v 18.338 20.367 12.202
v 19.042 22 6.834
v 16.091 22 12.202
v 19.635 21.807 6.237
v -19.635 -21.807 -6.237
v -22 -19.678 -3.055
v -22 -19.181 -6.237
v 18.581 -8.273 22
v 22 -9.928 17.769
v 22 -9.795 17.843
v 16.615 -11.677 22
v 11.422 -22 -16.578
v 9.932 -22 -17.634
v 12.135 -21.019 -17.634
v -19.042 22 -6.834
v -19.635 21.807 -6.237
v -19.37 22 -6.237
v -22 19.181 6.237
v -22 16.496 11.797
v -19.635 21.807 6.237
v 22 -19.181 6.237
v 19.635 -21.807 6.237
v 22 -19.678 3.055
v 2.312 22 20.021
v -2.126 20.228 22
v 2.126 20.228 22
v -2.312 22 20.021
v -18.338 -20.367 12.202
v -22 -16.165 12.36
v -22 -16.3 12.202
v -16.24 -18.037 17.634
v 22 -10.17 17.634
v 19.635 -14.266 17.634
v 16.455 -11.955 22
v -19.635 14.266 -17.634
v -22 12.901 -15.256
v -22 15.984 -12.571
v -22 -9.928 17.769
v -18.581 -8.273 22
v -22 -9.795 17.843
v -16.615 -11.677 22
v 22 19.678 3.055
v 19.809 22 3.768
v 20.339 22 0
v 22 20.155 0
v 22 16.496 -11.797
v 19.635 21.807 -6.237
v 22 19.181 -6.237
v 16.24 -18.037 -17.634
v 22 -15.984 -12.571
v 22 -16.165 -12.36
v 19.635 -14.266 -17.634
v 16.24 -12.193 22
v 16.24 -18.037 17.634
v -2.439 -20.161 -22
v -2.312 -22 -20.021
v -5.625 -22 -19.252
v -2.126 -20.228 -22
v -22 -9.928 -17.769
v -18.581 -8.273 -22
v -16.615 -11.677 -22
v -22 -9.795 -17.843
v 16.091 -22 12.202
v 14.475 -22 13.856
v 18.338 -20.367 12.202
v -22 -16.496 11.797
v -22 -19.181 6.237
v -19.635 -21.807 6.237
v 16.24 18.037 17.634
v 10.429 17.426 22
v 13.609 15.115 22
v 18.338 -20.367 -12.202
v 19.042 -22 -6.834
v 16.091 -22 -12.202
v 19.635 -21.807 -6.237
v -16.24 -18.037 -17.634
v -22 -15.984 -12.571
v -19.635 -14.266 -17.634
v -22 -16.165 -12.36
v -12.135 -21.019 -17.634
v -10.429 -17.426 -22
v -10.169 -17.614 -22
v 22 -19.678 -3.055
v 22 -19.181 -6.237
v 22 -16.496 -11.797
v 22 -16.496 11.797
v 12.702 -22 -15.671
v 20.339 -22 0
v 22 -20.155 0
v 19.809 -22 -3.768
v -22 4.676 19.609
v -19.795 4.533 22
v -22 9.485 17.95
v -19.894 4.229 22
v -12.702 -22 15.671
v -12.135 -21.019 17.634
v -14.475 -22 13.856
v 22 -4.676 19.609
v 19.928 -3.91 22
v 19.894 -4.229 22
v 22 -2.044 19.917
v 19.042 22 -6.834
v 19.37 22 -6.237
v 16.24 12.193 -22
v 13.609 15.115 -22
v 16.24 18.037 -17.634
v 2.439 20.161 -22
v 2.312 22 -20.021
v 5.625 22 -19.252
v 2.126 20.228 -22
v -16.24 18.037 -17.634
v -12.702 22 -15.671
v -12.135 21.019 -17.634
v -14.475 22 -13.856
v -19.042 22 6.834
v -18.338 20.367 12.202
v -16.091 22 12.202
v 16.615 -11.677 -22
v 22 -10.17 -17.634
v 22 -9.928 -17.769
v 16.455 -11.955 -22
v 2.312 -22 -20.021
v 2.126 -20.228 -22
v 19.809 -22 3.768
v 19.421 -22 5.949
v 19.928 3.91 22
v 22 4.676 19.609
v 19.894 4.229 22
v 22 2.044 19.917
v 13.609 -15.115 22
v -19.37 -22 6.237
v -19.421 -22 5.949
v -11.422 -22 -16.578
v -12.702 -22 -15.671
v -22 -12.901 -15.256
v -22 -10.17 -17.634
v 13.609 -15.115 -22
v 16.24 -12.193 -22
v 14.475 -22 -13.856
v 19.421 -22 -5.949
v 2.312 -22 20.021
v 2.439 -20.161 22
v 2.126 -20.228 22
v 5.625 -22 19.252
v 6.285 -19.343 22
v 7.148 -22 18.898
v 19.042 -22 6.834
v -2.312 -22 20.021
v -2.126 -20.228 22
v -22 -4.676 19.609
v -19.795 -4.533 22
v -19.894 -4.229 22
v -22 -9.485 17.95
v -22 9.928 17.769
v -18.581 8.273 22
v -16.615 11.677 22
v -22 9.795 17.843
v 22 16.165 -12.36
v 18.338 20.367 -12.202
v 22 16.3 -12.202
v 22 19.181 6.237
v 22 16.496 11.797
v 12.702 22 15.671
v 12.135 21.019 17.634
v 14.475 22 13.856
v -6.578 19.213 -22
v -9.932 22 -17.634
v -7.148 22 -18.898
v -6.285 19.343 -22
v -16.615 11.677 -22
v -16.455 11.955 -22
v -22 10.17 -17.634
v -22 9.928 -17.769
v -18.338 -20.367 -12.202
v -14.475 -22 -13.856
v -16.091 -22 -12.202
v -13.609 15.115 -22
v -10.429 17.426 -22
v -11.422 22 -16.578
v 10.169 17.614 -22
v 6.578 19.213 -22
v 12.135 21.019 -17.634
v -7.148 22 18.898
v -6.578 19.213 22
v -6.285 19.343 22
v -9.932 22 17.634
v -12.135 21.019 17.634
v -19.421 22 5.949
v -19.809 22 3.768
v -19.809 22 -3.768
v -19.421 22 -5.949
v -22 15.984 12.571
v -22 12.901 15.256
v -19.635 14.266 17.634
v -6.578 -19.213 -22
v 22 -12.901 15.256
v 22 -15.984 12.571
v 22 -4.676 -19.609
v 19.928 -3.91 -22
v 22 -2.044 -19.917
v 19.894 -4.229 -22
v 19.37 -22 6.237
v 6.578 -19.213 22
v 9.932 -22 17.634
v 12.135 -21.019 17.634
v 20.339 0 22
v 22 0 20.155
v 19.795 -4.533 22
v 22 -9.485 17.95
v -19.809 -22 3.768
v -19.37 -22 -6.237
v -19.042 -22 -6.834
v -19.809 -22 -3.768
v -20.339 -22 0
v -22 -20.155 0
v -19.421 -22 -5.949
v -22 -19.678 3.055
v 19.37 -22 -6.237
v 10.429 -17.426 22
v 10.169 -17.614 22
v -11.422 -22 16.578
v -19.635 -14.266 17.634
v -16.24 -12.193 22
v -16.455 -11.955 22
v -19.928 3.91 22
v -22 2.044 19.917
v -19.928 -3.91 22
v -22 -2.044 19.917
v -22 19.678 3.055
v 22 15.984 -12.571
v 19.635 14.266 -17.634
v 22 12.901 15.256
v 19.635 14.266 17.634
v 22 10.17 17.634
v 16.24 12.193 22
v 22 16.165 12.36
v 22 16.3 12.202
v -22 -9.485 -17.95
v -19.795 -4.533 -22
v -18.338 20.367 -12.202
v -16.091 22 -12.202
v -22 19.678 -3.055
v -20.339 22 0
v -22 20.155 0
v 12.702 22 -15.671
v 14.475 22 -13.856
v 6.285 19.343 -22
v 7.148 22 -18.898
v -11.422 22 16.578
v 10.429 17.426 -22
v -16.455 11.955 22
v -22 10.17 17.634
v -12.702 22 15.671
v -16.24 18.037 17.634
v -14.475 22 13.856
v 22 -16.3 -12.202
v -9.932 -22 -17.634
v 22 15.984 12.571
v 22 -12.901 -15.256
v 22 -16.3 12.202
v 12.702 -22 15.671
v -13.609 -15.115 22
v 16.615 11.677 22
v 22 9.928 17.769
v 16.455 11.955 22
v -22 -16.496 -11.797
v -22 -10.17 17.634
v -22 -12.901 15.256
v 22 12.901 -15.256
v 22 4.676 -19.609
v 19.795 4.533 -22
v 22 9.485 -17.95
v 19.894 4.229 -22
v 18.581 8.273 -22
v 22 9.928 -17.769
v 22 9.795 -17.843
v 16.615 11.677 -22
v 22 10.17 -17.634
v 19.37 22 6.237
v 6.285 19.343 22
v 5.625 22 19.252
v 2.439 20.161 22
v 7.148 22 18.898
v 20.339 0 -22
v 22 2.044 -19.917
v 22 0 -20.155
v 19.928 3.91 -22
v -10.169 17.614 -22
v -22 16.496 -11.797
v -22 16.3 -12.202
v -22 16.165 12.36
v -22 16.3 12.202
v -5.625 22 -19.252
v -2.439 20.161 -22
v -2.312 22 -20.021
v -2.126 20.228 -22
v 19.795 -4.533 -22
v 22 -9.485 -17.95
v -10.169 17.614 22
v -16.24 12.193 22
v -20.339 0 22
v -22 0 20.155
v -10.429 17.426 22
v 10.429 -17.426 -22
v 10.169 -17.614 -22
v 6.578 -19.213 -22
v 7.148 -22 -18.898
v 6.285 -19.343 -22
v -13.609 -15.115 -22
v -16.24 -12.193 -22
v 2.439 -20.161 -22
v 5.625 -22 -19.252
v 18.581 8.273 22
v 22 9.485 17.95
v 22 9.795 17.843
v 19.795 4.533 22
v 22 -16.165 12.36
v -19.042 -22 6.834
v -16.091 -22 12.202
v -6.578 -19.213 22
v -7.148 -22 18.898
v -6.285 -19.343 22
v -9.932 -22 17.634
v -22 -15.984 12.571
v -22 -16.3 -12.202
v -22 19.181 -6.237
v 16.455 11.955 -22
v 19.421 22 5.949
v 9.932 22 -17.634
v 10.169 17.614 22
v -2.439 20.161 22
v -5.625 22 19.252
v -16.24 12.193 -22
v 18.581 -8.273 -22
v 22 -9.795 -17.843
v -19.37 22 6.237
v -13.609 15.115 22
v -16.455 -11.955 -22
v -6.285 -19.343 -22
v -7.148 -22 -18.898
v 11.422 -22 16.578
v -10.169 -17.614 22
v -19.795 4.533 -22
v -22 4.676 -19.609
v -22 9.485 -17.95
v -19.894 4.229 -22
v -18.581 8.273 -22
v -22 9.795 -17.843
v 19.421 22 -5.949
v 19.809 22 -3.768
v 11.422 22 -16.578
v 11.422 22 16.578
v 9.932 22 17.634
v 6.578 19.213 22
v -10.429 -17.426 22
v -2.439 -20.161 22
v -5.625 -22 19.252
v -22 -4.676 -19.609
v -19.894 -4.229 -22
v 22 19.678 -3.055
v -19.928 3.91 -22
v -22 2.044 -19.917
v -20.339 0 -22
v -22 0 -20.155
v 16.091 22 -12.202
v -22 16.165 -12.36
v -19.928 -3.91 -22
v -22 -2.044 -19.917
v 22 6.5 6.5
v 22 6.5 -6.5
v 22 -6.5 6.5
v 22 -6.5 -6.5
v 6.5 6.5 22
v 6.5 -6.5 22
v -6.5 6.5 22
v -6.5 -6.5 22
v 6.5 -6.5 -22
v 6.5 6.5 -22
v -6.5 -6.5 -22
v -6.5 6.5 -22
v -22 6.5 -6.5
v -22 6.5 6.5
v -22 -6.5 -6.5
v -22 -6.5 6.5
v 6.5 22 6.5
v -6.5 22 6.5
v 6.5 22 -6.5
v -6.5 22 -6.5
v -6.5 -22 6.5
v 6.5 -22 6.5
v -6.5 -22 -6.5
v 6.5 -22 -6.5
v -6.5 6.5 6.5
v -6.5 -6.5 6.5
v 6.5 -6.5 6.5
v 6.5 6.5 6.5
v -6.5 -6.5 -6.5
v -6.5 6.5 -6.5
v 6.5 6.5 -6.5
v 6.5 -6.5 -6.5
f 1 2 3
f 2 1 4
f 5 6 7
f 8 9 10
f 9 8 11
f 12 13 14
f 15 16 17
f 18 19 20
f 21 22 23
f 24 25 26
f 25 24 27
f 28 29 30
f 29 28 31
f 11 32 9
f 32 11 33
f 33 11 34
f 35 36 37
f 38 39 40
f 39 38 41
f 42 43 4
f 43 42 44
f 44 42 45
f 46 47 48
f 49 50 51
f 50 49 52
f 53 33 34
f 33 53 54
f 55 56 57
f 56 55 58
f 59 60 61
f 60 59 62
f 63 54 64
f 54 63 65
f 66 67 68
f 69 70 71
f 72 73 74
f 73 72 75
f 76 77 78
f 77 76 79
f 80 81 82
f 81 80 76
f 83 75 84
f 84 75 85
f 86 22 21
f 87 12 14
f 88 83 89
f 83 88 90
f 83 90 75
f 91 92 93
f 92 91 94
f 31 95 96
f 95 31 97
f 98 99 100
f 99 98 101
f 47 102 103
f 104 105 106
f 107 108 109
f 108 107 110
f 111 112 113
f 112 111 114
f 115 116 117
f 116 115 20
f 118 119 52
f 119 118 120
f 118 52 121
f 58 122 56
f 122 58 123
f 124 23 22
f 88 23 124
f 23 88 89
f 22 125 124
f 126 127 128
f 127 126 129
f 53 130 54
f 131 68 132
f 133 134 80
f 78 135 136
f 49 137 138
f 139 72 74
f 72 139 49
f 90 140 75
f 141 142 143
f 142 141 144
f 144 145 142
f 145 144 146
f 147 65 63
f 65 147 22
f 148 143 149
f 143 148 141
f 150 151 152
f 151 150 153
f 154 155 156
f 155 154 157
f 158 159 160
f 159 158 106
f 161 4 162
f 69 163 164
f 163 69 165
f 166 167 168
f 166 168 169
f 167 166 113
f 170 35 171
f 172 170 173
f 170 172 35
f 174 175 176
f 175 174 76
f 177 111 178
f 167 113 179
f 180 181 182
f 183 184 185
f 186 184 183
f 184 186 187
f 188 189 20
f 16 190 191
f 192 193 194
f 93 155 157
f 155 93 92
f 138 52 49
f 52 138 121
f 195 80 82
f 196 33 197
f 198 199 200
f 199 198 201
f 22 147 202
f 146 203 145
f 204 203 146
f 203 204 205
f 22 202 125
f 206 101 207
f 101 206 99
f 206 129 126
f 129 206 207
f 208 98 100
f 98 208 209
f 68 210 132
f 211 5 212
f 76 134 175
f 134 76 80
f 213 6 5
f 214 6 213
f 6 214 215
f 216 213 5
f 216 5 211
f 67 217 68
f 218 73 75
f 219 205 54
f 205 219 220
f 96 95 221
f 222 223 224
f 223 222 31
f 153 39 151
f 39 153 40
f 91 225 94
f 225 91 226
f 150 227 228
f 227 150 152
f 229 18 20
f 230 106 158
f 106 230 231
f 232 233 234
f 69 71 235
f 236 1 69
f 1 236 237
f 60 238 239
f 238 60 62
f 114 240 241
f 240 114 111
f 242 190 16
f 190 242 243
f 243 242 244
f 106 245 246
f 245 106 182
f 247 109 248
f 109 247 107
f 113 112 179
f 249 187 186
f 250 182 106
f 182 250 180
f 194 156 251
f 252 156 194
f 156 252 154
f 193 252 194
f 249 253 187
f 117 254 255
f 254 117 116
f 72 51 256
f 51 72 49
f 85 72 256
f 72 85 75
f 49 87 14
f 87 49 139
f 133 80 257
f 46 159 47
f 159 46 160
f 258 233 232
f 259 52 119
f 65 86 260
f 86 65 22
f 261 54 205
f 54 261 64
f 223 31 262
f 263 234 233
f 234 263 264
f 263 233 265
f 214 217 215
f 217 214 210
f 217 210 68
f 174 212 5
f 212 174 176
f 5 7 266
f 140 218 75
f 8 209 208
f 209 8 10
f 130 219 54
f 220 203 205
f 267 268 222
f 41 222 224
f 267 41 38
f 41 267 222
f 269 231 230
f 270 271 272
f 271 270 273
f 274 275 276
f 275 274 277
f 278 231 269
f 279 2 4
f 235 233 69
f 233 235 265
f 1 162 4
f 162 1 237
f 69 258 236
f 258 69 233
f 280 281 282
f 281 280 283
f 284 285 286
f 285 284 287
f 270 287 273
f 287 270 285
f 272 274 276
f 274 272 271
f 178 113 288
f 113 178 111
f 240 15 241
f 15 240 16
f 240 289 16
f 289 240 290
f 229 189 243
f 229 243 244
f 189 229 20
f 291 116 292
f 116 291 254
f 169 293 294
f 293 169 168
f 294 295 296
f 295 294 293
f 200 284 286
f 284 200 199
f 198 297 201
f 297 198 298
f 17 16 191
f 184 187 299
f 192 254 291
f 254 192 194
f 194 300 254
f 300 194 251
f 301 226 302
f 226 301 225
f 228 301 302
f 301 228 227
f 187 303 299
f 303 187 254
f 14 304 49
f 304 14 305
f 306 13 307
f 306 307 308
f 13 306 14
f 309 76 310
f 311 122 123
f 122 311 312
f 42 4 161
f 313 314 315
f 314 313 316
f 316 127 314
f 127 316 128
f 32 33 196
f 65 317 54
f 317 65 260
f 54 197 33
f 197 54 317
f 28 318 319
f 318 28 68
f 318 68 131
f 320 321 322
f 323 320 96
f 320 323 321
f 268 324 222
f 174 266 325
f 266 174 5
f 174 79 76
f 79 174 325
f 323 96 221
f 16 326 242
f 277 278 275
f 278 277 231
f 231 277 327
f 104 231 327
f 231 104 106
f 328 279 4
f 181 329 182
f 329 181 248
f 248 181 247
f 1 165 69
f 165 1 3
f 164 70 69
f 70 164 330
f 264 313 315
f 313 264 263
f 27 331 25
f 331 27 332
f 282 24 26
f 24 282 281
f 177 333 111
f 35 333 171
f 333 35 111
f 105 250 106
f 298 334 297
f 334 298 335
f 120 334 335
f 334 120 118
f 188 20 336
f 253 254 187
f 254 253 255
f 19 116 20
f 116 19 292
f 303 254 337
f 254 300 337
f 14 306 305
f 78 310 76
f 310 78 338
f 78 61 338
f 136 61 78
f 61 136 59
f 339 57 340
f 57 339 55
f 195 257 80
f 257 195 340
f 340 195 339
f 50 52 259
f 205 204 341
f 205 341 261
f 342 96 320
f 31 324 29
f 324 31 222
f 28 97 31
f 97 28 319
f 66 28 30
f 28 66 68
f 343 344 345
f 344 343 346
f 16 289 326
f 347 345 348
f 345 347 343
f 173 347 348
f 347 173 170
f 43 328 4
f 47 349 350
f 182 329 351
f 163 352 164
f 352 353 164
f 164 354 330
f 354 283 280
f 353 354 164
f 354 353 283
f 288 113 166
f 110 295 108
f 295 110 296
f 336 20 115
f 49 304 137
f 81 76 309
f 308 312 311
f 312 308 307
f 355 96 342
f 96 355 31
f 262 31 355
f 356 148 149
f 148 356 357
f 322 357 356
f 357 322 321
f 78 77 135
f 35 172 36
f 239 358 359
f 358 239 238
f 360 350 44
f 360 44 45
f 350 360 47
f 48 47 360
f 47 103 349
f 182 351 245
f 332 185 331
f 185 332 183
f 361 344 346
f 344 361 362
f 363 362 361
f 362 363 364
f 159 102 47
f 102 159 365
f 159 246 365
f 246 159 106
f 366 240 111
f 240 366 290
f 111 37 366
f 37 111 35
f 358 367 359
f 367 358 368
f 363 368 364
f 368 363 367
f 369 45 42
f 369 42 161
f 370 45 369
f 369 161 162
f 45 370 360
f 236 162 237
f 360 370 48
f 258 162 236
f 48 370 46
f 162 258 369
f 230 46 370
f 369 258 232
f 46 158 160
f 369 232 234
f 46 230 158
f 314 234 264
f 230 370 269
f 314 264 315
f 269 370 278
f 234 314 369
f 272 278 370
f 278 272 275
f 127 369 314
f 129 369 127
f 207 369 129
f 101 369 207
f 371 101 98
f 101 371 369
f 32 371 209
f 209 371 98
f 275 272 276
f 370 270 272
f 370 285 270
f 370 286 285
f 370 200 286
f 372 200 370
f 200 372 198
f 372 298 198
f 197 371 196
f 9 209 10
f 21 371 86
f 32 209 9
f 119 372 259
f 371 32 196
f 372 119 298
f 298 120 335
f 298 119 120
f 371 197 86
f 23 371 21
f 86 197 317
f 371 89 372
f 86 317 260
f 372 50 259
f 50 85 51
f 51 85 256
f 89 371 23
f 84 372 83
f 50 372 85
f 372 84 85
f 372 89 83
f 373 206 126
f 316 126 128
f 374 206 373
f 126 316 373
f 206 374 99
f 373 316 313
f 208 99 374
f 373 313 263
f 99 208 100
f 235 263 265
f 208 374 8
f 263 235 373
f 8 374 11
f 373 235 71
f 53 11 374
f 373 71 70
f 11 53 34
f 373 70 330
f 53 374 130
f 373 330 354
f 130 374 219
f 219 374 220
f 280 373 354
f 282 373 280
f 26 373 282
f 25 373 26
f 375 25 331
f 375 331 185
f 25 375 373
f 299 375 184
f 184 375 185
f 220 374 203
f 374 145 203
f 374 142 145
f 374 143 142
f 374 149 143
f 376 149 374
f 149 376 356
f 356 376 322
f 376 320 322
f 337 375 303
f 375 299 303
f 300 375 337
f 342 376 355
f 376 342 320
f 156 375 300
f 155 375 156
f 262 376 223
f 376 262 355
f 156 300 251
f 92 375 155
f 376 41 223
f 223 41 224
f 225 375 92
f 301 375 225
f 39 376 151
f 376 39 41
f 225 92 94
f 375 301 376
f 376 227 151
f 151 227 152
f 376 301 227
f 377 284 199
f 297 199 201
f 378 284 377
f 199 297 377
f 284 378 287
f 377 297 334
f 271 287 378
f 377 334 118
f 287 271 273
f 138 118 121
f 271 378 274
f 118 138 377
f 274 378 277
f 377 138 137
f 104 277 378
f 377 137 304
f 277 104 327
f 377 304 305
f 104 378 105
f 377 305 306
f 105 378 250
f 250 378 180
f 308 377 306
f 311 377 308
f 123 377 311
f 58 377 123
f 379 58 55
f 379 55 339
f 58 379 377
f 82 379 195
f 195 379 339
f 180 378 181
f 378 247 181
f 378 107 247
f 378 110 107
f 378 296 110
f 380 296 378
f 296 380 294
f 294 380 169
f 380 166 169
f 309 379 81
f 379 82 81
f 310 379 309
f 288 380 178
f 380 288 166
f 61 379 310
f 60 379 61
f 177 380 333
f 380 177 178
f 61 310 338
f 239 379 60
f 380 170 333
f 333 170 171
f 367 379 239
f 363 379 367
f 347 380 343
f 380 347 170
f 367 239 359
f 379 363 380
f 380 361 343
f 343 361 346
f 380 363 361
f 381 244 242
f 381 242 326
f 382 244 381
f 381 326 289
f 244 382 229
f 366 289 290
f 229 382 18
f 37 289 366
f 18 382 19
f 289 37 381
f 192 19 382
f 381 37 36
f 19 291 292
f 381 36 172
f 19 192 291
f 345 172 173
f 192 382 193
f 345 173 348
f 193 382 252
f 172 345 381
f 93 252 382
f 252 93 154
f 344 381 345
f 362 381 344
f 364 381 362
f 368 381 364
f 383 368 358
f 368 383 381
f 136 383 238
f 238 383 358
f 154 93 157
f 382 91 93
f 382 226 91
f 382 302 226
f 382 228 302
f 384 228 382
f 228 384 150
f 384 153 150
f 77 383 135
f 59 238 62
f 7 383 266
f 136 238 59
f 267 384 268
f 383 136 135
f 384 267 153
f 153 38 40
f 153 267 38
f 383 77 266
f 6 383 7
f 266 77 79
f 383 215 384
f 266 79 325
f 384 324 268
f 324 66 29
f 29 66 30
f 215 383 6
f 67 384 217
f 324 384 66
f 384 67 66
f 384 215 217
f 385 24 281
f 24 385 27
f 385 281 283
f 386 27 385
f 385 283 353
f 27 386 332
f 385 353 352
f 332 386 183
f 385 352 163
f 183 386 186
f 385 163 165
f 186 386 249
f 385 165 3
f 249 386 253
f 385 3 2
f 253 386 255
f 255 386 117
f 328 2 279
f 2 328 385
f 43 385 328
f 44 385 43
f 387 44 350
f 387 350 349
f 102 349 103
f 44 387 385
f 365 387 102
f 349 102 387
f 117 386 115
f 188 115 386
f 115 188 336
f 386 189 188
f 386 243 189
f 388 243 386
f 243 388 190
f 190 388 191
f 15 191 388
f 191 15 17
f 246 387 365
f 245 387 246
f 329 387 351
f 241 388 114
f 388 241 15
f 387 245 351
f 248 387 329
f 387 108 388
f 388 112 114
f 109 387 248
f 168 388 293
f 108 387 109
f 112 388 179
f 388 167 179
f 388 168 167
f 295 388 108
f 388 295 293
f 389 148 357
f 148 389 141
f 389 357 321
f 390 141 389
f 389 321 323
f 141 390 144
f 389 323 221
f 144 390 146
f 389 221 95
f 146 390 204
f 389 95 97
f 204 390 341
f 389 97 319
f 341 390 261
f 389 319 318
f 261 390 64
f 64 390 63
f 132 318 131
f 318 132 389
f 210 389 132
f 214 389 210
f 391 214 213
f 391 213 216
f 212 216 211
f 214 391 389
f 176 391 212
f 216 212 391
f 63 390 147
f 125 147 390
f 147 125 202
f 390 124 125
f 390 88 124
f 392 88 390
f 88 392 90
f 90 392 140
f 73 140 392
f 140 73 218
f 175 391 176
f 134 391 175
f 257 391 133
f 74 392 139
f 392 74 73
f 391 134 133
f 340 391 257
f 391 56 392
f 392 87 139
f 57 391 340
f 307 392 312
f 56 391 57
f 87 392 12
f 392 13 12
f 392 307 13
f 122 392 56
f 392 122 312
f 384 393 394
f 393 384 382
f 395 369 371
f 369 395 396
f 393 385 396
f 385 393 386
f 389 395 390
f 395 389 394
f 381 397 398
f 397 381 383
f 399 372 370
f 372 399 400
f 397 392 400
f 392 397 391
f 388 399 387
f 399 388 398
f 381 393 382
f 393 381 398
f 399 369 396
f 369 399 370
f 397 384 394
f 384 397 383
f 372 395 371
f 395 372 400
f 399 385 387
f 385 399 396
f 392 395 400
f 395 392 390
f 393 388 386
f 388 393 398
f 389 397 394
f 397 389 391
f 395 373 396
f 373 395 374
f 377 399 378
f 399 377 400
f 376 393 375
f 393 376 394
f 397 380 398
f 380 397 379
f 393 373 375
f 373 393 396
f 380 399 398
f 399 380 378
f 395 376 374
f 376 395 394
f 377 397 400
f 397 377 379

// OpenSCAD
module die(radius, width, indent_radius, indent_depth){
	difference(){
		intersection(){
			sphere(radius);
			cube(2 * width, center=true);
		}
		translate([width, 0, 0]) scale([indent_depth/indent_radius, 1, 1])
			cube(indent_radius, center=true);
		translate([-width, 0, 0]) scale([indent_depth/indent_radius, 1, 1])
			cube(indent_radius, center=true);
		translate([0, width, 0]) scale([1, indent_depth/indent_radius, 1])
			cube(indent_radius, center=true);
		translate([0, -width, 0]) scale([1, indent_depth/indent_radius, 1])
			cube(indent_radius, center=true);
		translate([0, 0, width]) scale([1, 1, indent_depth/indent_radius])
			cube(indent_radius, center=true);
		translate([0, 0, -width]) scale([1, 1, indent_depth/indent_radius])
			cube(indent_radius, center=true);
	}
}

radius = 30;
width = 22;
indent_radius = 13;
indent_depth = 100;

die(radius, width, indent_radius, indent_depth);
